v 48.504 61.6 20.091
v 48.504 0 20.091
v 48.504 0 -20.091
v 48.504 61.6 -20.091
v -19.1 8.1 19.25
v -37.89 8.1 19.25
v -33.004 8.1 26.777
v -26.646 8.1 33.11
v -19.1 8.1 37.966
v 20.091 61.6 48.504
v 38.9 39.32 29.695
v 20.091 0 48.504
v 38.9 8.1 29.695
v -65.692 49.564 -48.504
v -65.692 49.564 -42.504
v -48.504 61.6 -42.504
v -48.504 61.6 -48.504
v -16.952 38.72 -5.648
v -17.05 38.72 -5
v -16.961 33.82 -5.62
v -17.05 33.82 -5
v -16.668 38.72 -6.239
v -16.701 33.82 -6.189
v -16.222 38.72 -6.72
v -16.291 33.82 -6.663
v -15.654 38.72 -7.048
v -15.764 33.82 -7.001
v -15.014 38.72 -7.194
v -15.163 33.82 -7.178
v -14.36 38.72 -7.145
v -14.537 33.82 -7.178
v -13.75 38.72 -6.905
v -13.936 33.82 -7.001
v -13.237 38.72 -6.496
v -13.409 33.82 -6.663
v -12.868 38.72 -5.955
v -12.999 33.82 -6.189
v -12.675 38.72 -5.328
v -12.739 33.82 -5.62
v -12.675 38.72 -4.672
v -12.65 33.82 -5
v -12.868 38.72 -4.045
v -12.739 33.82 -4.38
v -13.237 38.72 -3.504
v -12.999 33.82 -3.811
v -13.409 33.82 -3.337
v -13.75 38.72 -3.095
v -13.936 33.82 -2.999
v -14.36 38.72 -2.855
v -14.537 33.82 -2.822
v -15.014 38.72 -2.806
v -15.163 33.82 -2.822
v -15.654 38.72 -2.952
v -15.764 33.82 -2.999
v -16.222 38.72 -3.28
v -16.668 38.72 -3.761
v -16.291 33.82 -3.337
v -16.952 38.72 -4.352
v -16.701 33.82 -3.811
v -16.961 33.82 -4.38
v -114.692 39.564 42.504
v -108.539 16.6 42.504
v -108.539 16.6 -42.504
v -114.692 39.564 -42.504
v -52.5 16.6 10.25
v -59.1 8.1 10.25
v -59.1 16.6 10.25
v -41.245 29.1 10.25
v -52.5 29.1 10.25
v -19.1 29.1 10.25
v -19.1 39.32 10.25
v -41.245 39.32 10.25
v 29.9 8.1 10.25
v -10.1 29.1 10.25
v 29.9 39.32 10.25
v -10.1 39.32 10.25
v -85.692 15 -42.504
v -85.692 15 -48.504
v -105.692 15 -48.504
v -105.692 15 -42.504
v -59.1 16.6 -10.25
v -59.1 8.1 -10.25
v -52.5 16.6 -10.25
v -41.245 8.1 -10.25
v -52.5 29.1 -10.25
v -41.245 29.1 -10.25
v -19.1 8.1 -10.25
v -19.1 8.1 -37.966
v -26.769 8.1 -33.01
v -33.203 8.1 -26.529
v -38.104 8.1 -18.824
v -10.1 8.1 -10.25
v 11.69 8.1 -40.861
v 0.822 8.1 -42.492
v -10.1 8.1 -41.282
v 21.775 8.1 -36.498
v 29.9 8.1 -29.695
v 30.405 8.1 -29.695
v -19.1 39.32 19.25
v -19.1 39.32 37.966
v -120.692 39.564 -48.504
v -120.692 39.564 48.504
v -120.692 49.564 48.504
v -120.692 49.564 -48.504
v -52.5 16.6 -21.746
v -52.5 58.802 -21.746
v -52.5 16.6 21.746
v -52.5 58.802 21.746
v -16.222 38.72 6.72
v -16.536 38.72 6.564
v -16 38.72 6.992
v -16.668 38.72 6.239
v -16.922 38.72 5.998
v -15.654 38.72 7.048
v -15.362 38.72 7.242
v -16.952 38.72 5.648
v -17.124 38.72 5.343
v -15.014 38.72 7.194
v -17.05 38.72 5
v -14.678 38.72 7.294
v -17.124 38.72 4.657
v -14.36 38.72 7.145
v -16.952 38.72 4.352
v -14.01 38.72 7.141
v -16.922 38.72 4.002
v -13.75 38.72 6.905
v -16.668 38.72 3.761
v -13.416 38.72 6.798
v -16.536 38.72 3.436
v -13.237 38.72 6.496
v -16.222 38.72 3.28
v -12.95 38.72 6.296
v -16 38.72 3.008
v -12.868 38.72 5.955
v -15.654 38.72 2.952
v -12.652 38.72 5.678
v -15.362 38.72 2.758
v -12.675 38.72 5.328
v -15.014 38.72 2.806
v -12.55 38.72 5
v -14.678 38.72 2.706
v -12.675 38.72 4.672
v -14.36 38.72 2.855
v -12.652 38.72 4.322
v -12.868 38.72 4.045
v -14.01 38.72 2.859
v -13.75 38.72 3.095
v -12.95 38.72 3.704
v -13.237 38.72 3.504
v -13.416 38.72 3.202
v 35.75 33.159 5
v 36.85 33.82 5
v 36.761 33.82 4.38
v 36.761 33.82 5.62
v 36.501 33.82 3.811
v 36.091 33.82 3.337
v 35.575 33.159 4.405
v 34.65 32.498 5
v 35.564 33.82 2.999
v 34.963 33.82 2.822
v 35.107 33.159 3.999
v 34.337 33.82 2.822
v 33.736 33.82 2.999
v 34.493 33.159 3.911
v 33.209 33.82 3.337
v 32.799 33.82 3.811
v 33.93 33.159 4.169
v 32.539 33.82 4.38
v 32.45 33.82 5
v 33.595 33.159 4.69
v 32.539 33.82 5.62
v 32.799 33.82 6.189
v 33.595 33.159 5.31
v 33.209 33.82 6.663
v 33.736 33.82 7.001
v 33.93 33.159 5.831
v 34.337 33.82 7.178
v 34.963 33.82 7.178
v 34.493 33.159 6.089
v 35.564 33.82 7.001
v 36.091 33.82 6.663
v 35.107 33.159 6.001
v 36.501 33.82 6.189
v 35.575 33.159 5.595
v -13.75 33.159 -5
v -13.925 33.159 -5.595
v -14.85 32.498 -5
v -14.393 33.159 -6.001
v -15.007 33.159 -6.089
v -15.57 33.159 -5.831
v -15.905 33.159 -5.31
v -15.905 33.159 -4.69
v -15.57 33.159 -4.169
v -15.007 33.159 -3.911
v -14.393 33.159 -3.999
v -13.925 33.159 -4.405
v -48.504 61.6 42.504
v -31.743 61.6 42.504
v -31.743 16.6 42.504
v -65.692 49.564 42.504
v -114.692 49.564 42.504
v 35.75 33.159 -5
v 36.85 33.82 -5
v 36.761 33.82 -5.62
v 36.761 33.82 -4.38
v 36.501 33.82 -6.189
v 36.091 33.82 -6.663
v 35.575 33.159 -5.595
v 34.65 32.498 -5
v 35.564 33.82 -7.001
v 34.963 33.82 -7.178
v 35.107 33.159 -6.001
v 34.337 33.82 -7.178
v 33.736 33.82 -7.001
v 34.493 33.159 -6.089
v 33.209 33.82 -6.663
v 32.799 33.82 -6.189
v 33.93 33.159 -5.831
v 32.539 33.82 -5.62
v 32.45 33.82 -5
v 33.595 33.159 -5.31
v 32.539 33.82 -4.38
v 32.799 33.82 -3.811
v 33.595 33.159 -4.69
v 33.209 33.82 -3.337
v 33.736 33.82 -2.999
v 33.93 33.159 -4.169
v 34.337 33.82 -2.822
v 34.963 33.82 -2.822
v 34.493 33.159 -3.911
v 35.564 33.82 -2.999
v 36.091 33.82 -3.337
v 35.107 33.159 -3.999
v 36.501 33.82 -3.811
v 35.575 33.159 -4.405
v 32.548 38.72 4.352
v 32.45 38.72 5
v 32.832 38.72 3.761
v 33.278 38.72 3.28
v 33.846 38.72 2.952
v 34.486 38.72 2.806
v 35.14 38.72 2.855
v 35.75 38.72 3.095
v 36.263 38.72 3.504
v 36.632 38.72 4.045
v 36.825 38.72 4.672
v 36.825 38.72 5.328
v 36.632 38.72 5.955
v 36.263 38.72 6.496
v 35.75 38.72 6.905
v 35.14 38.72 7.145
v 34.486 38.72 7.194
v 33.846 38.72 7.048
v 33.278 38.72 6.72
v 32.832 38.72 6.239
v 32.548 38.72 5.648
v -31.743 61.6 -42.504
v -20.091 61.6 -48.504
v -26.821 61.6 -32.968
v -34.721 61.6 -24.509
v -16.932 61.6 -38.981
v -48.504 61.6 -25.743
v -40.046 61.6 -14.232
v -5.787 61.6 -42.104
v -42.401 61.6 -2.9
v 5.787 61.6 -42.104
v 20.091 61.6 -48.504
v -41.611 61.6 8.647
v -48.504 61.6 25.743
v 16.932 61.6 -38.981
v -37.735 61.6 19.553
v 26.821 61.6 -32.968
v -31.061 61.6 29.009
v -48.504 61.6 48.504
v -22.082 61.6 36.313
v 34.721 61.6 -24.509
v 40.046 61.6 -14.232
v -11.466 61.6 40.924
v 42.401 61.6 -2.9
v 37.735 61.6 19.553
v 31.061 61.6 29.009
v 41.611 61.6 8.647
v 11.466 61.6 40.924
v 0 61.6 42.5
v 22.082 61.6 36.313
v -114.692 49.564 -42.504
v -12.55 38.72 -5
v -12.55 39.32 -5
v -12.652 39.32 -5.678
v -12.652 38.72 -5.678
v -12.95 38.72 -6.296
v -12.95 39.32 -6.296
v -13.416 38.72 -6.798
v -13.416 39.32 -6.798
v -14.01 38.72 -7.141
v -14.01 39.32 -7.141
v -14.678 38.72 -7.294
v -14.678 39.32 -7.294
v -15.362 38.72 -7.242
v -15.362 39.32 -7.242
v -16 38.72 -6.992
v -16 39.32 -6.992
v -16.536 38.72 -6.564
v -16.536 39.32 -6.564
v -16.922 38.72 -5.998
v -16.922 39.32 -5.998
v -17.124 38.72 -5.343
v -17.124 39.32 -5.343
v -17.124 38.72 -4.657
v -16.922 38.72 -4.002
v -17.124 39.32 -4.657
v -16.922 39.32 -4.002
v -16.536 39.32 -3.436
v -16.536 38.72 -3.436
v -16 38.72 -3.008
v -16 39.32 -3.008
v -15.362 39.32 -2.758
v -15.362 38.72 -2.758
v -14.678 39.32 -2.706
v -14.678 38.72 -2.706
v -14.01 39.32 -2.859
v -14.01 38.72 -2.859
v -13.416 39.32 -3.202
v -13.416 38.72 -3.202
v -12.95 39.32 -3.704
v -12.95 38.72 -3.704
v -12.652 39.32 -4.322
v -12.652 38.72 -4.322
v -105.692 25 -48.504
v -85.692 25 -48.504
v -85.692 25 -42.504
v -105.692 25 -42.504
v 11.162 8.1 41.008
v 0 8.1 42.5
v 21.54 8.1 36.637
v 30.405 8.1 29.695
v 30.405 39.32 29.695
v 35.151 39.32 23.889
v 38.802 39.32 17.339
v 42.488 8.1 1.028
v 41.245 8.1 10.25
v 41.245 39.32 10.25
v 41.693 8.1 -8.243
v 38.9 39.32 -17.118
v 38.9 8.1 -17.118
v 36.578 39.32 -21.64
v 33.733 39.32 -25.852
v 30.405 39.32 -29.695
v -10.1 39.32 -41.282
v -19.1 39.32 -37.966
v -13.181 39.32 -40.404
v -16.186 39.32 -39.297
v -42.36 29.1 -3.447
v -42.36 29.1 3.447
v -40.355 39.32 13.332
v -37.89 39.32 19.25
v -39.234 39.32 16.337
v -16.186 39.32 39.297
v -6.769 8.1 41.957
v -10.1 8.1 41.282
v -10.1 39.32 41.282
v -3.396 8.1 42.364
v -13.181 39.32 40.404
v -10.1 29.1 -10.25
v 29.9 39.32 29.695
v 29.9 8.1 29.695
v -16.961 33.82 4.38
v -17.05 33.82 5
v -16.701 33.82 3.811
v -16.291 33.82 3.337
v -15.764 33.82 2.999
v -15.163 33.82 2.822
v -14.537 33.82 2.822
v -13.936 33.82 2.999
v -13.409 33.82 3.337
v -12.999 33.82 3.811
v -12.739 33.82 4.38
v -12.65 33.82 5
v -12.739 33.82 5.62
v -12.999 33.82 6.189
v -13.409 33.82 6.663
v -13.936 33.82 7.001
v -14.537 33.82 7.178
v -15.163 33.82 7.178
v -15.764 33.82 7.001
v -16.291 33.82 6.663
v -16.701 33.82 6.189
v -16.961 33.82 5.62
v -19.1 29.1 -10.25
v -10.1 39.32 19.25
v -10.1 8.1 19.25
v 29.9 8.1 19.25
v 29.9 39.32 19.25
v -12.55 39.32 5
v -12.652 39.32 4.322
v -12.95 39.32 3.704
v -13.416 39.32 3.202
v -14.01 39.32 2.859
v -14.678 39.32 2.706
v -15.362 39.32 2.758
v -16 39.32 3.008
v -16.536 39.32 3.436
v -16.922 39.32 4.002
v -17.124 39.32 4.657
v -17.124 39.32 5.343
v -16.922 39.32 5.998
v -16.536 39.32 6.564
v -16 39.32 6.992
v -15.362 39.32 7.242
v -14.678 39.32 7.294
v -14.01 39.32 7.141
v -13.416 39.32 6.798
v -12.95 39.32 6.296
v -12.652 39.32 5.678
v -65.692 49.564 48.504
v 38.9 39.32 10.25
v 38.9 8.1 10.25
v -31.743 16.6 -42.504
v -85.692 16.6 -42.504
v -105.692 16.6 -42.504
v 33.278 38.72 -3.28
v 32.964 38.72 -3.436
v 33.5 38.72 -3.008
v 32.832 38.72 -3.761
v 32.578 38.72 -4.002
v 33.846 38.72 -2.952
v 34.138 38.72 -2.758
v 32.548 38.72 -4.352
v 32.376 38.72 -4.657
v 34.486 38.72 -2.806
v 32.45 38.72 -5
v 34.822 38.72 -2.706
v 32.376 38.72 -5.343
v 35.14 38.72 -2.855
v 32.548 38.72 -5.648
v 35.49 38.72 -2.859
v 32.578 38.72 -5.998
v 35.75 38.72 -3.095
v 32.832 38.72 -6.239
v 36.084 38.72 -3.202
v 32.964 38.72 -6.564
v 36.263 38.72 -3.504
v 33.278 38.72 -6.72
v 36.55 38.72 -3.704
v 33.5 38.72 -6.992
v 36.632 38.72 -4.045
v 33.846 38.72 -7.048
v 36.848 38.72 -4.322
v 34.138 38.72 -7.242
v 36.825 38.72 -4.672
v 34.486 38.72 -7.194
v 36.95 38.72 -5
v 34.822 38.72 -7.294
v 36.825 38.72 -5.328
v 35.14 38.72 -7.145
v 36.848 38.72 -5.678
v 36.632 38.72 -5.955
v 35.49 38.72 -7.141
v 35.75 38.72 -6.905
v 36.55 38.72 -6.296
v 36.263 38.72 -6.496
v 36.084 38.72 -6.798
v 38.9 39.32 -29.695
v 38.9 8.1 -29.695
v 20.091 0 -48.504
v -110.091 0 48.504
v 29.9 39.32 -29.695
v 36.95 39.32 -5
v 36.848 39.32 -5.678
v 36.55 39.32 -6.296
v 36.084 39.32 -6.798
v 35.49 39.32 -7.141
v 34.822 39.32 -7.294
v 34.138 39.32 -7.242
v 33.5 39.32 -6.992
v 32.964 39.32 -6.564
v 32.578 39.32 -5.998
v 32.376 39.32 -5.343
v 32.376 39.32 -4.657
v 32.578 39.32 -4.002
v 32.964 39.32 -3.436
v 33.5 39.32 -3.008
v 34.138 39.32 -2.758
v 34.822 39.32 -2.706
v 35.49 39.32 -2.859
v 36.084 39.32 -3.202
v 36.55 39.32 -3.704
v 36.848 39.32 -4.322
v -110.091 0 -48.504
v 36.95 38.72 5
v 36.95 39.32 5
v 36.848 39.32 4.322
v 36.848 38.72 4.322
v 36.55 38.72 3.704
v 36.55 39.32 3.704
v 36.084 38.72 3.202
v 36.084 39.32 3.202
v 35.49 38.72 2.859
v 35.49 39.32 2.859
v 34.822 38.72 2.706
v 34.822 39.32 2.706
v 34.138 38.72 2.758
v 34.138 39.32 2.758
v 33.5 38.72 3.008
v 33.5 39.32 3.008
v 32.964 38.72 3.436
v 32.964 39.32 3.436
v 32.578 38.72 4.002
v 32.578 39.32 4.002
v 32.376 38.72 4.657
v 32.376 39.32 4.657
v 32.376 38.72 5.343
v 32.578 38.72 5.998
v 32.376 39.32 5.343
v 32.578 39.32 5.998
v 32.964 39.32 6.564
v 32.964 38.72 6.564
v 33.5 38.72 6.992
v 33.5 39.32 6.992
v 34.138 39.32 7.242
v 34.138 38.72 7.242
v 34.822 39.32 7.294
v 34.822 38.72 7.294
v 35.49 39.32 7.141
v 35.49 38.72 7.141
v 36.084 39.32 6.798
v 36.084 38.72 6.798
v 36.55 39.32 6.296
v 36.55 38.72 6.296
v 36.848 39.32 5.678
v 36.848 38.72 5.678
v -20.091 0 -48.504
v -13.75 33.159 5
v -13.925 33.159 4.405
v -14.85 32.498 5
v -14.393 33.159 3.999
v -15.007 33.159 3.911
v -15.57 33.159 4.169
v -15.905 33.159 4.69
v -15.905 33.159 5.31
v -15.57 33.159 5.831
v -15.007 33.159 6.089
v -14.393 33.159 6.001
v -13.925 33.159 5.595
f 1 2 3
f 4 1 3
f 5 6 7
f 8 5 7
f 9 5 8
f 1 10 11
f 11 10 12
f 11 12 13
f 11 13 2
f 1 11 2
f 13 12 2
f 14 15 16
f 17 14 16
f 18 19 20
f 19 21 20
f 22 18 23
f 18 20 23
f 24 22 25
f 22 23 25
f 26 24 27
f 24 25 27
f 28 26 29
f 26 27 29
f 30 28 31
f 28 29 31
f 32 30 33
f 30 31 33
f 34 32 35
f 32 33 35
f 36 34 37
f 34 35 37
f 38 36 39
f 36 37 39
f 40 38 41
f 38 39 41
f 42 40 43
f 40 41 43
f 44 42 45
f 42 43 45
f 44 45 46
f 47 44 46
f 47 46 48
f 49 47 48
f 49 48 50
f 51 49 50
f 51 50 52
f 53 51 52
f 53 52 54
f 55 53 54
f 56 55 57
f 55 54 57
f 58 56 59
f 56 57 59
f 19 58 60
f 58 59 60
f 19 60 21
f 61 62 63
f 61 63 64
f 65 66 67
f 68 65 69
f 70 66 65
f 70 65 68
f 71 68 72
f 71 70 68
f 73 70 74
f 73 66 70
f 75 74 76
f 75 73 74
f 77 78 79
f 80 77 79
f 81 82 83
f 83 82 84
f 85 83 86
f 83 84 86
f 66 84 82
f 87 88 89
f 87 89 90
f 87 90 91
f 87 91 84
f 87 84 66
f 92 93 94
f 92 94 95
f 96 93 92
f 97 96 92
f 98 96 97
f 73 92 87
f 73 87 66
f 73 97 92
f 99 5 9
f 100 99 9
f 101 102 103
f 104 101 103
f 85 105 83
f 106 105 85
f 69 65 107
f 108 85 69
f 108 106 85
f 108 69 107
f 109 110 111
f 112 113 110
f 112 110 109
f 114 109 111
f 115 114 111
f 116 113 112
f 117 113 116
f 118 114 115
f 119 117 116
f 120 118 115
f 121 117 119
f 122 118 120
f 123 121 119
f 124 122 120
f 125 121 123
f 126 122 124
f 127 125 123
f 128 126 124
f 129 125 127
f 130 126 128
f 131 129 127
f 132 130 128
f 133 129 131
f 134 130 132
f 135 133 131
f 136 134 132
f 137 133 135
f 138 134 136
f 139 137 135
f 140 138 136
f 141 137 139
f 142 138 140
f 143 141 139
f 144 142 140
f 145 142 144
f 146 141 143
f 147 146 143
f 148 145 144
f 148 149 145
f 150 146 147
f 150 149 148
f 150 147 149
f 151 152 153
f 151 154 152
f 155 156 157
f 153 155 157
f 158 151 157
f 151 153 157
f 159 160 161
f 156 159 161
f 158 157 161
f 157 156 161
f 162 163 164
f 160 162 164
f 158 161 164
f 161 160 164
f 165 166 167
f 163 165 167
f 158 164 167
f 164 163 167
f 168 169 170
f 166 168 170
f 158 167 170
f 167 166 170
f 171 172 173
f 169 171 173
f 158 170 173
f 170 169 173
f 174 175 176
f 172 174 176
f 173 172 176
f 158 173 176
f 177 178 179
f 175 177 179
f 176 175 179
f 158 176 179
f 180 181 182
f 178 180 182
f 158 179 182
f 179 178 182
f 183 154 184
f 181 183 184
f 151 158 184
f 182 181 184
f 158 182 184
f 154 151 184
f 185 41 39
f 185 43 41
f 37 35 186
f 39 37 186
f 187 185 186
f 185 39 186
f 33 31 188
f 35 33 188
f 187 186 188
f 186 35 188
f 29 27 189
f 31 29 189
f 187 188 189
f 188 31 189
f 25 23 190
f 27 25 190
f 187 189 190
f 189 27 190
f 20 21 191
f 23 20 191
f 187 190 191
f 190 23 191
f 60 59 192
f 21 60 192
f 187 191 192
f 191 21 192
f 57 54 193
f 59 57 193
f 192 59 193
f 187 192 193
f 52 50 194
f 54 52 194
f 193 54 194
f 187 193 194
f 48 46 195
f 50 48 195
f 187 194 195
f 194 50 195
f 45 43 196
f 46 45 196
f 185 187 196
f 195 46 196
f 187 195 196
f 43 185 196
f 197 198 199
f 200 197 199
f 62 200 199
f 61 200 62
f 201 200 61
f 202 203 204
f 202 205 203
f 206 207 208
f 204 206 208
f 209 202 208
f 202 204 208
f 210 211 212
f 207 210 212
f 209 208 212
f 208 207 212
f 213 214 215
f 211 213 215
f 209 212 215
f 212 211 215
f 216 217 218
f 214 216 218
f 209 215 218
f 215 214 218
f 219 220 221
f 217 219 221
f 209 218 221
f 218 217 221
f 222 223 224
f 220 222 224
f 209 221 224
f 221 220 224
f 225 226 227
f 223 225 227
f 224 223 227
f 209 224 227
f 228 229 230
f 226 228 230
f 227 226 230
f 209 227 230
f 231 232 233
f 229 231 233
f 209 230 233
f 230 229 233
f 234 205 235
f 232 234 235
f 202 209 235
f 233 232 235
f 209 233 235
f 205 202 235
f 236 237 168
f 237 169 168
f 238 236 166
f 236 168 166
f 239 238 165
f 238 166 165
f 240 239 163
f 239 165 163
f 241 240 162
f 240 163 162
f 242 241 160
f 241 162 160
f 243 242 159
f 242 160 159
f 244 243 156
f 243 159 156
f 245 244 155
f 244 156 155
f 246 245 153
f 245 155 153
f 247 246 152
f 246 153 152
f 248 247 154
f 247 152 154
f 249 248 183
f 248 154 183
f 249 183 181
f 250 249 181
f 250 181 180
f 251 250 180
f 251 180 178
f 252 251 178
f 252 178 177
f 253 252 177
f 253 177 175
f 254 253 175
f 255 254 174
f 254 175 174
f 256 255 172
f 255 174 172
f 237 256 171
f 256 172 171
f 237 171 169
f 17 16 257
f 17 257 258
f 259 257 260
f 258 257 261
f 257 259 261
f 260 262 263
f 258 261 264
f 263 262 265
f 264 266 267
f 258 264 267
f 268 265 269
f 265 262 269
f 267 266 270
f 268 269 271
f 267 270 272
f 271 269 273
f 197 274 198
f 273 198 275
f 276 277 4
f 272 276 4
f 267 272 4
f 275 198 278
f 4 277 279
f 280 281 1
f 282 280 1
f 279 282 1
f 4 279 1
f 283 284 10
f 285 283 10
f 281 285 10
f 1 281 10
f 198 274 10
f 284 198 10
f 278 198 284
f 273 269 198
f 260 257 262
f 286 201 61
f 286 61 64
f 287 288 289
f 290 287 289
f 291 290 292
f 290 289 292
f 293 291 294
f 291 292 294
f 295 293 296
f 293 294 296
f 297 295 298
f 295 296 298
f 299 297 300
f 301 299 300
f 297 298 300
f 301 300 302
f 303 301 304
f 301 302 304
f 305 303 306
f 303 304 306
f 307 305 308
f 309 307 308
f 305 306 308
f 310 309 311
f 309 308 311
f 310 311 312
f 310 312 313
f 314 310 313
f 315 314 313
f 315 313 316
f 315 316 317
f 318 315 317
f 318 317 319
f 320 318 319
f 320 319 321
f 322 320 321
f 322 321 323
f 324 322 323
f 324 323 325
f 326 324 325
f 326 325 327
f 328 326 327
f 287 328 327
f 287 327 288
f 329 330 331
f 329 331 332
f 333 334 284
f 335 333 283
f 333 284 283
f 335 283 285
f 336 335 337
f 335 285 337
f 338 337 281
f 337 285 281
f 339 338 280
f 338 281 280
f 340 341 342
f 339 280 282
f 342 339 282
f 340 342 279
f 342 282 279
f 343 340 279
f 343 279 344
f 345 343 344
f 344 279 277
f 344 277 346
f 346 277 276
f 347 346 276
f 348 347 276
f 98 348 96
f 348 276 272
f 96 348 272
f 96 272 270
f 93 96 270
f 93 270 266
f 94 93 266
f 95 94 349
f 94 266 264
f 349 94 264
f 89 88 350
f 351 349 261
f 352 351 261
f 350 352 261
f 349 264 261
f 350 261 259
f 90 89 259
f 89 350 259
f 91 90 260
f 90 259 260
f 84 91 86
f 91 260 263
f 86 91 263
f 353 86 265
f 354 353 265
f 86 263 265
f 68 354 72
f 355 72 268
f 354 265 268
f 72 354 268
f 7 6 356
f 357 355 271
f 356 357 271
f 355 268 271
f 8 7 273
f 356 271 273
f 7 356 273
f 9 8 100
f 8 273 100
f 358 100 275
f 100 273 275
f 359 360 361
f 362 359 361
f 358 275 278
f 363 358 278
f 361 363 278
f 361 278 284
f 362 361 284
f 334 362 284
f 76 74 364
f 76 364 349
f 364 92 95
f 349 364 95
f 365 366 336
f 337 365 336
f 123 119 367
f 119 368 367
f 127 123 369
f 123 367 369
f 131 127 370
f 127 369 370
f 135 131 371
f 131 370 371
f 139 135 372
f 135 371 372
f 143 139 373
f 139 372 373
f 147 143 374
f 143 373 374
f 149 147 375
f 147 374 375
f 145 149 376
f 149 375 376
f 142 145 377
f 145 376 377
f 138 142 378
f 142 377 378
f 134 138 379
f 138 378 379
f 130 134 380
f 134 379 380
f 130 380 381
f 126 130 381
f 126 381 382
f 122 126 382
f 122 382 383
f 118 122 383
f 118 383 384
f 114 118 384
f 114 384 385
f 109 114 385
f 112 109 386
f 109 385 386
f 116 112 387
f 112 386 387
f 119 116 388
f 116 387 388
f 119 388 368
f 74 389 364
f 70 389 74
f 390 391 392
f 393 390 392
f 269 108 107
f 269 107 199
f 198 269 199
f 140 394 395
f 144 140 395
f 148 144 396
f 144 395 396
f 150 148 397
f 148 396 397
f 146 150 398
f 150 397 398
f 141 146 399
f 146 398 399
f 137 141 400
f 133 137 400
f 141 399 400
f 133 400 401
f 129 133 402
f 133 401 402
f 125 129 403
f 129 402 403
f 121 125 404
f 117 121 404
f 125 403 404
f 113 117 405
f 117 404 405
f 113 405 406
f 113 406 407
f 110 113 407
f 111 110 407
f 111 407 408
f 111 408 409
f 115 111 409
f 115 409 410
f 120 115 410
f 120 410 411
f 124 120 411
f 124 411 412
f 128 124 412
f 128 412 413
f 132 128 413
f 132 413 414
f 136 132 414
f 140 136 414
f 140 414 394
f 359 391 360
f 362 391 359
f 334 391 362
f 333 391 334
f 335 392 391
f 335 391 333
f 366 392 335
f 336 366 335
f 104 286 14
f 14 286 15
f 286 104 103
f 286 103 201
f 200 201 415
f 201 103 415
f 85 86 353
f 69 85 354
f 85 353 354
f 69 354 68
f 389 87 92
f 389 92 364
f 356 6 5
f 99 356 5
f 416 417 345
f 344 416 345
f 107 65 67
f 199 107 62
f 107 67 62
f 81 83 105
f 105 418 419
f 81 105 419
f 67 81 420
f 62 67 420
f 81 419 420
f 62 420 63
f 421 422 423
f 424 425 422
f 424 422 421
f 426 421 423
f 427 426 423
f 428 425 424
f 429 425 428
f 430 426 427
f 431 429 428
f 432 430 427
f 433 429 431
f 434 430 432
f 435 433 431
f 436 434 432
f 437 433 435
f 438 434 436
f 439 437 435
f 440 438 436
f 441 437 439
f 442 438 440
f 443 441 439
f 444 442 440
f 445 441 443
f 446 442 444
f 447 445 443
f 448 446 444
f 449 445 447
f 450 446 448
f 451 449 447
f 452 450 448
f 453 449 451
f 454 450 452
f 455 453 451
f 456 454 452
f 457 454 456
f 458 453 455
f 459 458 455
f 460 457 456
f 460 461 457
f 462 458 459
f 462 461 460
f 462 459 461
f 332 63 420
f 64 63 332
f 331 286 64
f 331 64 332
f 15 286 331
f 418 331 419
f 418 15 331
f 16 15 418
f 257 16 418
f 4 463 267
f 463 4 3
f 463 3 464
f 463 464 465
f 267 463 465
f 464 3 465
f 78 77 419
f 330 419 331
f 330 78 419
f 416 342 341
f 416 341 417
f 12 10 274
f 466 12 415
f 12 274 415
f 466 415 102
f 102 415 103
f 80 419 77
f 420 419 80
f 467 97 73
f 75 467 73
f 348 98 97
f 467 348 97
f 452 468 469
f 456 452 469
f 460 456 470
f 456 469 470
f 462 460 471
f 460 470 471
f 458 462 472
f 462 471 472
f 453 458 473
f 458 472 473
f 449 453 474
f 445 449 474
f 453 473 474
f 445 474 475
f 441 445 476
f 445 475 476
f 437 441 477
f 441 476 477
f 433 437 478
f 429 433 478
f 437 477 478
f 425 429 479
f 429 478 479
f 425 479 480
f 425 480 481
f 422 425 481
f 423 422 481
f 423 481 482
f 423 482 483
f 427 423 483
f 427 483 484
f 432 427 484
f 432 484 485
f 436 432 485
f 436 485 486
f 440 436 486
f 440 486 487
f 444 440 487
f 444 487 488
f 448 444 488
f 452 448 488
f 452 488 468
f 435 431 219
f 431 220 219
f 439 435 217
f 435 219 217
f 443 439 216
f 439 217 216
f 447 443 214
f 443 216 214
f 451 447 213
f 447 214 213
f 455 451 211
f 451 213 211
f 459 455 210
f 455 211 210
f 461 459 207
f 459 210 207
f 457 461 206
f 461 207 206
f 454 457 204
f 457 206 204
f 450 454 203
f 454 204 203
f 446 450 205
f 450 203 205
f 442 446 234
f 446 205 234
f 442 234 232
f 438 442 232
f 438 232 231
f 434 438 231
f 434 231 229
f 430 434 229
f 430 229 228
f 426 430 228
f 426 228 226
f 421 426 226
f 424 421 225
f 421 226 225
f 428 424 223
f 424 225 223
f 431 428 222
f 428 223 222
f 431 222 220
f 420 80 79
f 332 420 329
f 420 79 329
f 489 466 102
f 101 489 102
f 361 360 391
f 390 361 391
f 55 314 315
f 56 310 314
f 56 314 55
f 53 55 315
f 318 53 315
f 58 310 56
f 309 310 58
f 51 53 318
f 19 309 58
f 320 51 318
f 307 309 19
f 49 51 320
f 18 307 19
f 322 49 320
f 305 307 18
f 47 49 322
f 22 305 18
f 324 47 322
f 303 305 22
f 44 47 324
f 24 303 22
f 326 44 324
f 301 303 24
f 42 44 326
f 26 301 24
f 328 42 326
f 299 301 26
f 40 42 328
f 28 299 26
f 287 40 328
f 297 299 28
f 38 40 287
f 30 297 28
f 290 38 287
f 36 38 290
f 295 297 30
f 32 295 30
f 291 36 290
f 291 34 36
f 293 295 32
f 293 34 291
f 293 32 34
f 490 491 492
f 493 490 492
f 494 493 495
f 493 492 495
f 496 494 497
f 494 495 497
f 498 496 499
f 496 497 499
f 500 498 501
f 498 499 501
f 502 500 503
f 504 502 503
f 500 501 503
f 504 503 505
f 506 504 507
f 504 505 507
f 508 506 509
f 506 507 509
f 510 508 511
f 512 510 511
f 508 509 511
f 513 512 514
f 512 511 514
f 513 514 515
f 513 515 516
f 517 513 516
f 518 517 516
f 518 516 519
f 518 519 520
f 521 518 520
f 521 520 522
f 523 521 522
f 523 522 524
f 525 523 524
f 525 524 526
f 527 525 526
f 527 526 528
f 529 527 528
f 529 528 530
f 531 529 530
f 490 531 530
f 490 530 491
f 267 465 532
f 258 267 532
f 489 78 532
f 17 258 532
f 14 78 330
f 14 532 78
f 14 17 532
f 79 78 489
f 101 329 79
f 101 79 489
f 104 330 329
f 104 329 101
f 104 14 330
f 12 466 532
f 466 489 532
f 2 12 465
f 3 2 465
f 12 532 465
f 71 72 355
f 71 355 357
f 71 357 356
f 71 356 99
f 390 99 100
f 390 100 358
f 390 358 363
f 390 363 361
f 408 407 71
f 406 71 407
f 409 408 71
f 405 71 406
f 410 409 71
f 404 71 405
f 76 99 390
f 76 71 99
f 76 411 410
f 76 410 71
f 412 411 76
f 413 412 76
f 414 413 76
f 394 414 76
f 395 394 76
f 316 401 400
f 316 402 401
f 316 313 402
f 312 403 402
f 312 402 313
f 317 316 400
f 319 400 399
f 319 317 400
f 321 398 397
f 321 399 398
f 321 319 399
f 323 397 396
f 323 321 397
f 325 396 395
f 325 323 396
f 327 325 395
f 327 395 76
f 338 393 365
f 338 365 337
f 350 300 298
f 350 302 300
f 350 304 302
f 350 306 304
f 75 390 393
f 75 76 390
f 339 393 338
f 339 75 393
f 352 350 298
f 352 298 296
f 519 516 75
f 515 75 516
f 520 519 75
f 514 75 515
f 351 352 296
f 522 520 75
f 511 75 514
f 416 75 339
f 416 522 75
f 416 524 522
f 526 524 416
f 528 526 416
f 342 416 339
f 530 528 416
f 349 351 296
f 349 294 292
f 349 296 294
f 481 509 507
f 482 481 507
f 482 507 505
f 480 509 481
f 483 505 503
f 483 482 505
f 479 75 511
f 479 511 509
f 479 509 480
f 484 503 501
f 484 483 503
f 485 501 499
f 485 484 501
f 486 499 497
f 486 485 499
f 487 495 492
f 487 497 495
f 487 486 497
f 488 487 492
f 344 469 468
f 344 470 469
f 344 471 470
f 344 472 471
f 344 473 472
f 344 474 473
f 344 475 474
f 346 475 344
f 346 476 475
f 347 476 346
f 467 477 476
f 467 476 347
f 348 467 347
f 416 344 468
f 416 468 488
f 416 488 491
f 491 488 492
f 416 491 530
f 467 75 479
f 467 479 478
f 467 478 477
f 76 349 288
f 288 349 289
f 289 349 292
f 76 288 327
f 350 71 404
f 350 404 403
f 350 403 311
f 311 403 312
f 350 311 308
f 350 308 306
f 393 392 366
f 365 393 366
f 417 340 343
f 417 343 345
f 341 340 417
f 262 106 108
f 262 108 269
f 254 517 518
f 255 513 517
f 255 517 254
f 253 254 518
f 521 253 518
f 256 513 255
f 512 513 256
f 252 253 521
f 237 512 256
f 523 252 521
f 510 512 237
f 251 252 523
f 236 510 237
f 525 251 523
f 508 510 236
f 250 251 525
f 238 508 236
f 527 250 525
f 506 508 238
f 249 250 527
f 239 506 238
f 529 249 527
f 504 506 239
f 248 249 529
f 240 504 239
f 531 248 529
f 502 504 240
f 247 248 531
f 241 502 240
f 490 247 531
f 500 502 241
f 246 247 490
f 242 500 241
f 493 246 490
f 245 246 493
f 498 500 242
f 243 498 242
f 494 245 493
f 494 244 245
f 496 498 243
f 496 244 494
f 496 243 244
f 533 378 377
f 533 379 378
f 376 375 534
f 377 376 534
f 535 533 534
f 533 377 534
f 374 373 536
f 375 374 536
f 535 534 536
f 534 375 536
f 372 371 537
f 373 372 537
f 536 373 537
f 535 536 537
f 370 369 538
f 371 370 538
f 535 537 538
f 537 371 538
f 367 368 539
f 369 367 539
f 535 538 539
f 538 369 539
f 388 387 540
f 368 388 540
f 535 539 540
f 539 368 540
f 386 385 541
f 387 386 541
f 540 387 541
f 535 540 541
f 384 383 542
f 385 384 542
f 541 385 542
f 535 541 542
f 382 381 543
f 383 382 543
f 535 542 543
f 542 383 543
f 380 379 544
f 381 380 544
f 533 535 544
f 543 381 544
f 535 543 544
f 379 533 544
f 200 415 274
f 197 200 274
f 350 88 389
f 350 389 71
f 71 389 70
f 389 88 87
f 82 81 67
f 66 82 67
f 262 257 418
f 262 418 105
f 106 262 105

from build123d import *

# Parameters (mm, degrees)
BOSS_EXTRUDE1_DEPTH                          = 61.6
BOSS_EXTRUDE3_DEPTH                          = 97.007351
SKETCH3_R                                    = 42.5
CUT_EXTRUDE1_DEPTH                           = 53.5
BOSS_EXTRUDE2_START                          = 8.1
BOSS_EXTRUDE2_DEPTH                          = 31.22
CBORE_FOR_M5_HEX_HEAD_CAP_SCREW1_D           = 4.4
CBORE_FOR_M5_HEX_HEAD_CAP_SCREW1_DEPTH       = 5.5
CBORE_FOR_M5_HEX_HEAD_CAP_SCREW1_CBORE_D     = 4.6
CBORE_FOR_M5_HEX_HEAD_CAP_SCREW1_CBORE_DEPTH = 0.6
CBORE_FOR_M5_HEX_HEAD_CAP_SCREW1_TIP         = 1.321893362
CUT_EXTRUDE3_DEPTH                           = 45
BOSS_EXTRUDE4_REACH                          = 168.648
CUT_EXTRUDE2_REACH                           = 130.328
SKETCH6_W                                    = 20.5
SKETCH6_H                                    = 21
CUT_EXTRUDE2_DIRECTION_2_DEPTH               = 40
SKETCH13_W                                   = 20
SKETCH13_H                                   = 10
CUT_EXTRUDE4_DEPTH                           = 6


with BuildPart() as part:
    # Sketch1 → Boss-Extrude1 (new body)
    with BuildSketch(Plane(origin=(0, 0, 0), x_dir=(1, 0, 0), z_dir=(0, 1, 0))):
        Polygon((-48.503675457, 20.090880199), (-48.503675457, -20.090880199), (-20.090880199, -48.503675457), (20.090880199, -48.503675457), (48.503675457, -20.090880199), (48.503675457, 20.090880199), (20.090880199, 48.503675457), (-20.090880199, 48.503675457), align=None)
    extrude(amount=BOSS_EXTRUDE1_DEPTH)

    # Sketch10 → Boss-Extrude3 (add, through all)
    with BuildSketch(Plane.XY.offset(48.503675457)):
        Polygon((-20.090880199, 0), (-110.090880199, 0), (-120.692155197, 39.564496916), (-120.692155197, 49.564496916), (-65.692155197, 49.564496916), (-48.503675457, 61.6), (-20.090880199, 61.6), align=None)
    extrude(amount=-BOSS_EXTRUDE3_DEPTH)

    # Sketch3 → Cut-Extrude1 (cut)
    with BuildSketch(Plane(origin=(0, 61.6, 0), x_dir=(1, 0, 0), z_dir=(0, 1, 0))):
        with Locations(Location((0, 0, 0), (0, 0, 270))):
            Circle(SKETCH3_R)
    extrude(amount=-CUT_EXTRUDE1_DEPTH, mode=Mode.SUBTRACT)

    # Sketch5 → Boss-Extrude2 (add)
    with BuildSketch(Plane(origin=(0, 0, 0), x_dir=(1, 0, 0), z_dir=(0, 1, 0)).offset(BOSS_EXTRUDE2_START)):
        Polygon((41.245454295, -10.25), (38.9, -10.25), (38.9, 29.694555656), (29.9, 29.694555656), (29.9, -10.25), (-10.1, -10.25), (-10.1, 41.282441788), (-19.1, 41.282441788), (-19.1, -10.25), (-41.245454295, -10.25), (-41.245454295, -19.25), (-19.1, -19.25), (-19.1, -41.282441788), (-10.1, -41.282441788), (-10.1, -19.25), (29.9, -19.25), (29.9, -29.694555656), (38.9, -29.694555656), (38.9, -19.25), (41.245454295, -19.25), align=None)
    extrude(amount=BOSS_EXTRUDE2_DEPTH)

    # CBORE for M5 Hex Head Cap Screw1
    with Locations(Plane(origin=(0, 39.32, 0), x_dir=(1, 0, 0), z_dir=(0, 1, 0))):
        with Locations((-14.85, -5), (-14.85, 5), (34.65, 5), (34.65, -5)):
            CounterBoreHole(CBORE_FOR_M5_HEX_HEAD_CAP_SCREW1_D / 2, CBORE_FOR_M5_HEX_HEAD_CAP_SCREW1_CBORE_D / 2, CBORE_FOR_M5_HEX_HEAD_CAP_SCREW1_CBORE_DEPTH, depth=CBORE_FOR_M5_HEX_HEAD_CAP_SCREW1_DEPTH)
            with Locations((0, 0, -(CBORE_FOR_M5_HEX_HEAD_CAP_SCREW1_DEPTH + CBORE_FOR_M5_HEX_HEAD_CAP_SCREW1_TIP / 2))):  # 118° drill point
                Cone(0, CBORE_FOR_M5_HEX_HEAD_CAP_SCREW1_D / 2, CBORE_FOR_M5_HEX_HEAD_CAP_SCREW1_TIP, mode=Mode.SUBTRACT)

    # Sketch11 → Cut-Extrude3 (cut)
    with BuildSketch(Plane(origin=(0, 61.6, 0), x_dir=(1, 0, 0), z_dir=(0, 1, 0))):
        Polygon((-52.5, 21.746212025), (-52.5, -21.746212025), (-31.742536568, -42.503675457), (-114.692155197, -42.503675457), (-114.692155197, 42.503675457), (-31.742536568, 42.503675457), align=None)
    extrude(amount=-CUT_EXTRUDE3_DEPTH, mode=Mode.SUBTRACT)

    # Sketch12 → Boss-Extrude4 (add, up to next)
    with BuildSketch(Plane.XY.offset(48.503675457), mode=Mode.PRIVATE) as boss_extrude4_sk1:
        Polygon((-110.090880199, 0), (-104.090880199, 0), (-114.692155197, 39.564496916), (-120.692155197, 39.564496916), align=None)
    boss_extrude4_tool1 = extrude(boss_extrude4_sk1.sketch, amount=-BOSS_EXTRUDE4_REACH, mode=Mode.PRIVATE) - part.part
    add(boss_extrude4_tool1.solids().sort_by_distance((-112.391518, 19.782248, 48.503675))[0])

    # Sketch6 → Cut-Extrude2 (cut, up to next)
    with BuildSketch(Plane.ZY.offset(19.1), mode=Mode.PRIVATE) as cut_extrude2_sk1:
        with Locations((0, 18.6)):
            Rectangle(SKETCH6_W, SKETCH6_H)
    cut_extrude2_tool1 = extrude(cut_extrude2_sk1.sketch, amount=-CUT_EXTRUDE2_REACH, mode=Mode.PRIVATE) & part.part
    add(cut_extrude2_tool1.solids().sort_by_distance((-19.1, 18.6, 0))[0], mode=Mode.SUBTRACT)

    # Sketch6 → Cut-Extrude2 direction 2 (cut)
    with BuildSketch(Plane.ZY.offset(19.1)):
        with Locations((0, 18.6)):
            Rectangle(SKETCH6_W, SKETCH6_H)
    extrude(amount=CUT_EXTRUDE2_DIRECTION_2_DEPTH, mode=Mode.SUBTRACT)

    # Sketch13 → Cut-Extrude4 (cut)
    with BuildSketch(Plane(origin=(0, 0, -48.503675457), x_dir=(-1, 0, 0), z_dir=(0, 0, -1))):
        with Locations((95.692155197, 20)):
            Rectangle(SKETCH13_W, SKETCH13_H)
    extrude(amount=-CUT_EXTRUDE4_DEPTH, mode=Mode.SUBTRACT)


solid = part.part
